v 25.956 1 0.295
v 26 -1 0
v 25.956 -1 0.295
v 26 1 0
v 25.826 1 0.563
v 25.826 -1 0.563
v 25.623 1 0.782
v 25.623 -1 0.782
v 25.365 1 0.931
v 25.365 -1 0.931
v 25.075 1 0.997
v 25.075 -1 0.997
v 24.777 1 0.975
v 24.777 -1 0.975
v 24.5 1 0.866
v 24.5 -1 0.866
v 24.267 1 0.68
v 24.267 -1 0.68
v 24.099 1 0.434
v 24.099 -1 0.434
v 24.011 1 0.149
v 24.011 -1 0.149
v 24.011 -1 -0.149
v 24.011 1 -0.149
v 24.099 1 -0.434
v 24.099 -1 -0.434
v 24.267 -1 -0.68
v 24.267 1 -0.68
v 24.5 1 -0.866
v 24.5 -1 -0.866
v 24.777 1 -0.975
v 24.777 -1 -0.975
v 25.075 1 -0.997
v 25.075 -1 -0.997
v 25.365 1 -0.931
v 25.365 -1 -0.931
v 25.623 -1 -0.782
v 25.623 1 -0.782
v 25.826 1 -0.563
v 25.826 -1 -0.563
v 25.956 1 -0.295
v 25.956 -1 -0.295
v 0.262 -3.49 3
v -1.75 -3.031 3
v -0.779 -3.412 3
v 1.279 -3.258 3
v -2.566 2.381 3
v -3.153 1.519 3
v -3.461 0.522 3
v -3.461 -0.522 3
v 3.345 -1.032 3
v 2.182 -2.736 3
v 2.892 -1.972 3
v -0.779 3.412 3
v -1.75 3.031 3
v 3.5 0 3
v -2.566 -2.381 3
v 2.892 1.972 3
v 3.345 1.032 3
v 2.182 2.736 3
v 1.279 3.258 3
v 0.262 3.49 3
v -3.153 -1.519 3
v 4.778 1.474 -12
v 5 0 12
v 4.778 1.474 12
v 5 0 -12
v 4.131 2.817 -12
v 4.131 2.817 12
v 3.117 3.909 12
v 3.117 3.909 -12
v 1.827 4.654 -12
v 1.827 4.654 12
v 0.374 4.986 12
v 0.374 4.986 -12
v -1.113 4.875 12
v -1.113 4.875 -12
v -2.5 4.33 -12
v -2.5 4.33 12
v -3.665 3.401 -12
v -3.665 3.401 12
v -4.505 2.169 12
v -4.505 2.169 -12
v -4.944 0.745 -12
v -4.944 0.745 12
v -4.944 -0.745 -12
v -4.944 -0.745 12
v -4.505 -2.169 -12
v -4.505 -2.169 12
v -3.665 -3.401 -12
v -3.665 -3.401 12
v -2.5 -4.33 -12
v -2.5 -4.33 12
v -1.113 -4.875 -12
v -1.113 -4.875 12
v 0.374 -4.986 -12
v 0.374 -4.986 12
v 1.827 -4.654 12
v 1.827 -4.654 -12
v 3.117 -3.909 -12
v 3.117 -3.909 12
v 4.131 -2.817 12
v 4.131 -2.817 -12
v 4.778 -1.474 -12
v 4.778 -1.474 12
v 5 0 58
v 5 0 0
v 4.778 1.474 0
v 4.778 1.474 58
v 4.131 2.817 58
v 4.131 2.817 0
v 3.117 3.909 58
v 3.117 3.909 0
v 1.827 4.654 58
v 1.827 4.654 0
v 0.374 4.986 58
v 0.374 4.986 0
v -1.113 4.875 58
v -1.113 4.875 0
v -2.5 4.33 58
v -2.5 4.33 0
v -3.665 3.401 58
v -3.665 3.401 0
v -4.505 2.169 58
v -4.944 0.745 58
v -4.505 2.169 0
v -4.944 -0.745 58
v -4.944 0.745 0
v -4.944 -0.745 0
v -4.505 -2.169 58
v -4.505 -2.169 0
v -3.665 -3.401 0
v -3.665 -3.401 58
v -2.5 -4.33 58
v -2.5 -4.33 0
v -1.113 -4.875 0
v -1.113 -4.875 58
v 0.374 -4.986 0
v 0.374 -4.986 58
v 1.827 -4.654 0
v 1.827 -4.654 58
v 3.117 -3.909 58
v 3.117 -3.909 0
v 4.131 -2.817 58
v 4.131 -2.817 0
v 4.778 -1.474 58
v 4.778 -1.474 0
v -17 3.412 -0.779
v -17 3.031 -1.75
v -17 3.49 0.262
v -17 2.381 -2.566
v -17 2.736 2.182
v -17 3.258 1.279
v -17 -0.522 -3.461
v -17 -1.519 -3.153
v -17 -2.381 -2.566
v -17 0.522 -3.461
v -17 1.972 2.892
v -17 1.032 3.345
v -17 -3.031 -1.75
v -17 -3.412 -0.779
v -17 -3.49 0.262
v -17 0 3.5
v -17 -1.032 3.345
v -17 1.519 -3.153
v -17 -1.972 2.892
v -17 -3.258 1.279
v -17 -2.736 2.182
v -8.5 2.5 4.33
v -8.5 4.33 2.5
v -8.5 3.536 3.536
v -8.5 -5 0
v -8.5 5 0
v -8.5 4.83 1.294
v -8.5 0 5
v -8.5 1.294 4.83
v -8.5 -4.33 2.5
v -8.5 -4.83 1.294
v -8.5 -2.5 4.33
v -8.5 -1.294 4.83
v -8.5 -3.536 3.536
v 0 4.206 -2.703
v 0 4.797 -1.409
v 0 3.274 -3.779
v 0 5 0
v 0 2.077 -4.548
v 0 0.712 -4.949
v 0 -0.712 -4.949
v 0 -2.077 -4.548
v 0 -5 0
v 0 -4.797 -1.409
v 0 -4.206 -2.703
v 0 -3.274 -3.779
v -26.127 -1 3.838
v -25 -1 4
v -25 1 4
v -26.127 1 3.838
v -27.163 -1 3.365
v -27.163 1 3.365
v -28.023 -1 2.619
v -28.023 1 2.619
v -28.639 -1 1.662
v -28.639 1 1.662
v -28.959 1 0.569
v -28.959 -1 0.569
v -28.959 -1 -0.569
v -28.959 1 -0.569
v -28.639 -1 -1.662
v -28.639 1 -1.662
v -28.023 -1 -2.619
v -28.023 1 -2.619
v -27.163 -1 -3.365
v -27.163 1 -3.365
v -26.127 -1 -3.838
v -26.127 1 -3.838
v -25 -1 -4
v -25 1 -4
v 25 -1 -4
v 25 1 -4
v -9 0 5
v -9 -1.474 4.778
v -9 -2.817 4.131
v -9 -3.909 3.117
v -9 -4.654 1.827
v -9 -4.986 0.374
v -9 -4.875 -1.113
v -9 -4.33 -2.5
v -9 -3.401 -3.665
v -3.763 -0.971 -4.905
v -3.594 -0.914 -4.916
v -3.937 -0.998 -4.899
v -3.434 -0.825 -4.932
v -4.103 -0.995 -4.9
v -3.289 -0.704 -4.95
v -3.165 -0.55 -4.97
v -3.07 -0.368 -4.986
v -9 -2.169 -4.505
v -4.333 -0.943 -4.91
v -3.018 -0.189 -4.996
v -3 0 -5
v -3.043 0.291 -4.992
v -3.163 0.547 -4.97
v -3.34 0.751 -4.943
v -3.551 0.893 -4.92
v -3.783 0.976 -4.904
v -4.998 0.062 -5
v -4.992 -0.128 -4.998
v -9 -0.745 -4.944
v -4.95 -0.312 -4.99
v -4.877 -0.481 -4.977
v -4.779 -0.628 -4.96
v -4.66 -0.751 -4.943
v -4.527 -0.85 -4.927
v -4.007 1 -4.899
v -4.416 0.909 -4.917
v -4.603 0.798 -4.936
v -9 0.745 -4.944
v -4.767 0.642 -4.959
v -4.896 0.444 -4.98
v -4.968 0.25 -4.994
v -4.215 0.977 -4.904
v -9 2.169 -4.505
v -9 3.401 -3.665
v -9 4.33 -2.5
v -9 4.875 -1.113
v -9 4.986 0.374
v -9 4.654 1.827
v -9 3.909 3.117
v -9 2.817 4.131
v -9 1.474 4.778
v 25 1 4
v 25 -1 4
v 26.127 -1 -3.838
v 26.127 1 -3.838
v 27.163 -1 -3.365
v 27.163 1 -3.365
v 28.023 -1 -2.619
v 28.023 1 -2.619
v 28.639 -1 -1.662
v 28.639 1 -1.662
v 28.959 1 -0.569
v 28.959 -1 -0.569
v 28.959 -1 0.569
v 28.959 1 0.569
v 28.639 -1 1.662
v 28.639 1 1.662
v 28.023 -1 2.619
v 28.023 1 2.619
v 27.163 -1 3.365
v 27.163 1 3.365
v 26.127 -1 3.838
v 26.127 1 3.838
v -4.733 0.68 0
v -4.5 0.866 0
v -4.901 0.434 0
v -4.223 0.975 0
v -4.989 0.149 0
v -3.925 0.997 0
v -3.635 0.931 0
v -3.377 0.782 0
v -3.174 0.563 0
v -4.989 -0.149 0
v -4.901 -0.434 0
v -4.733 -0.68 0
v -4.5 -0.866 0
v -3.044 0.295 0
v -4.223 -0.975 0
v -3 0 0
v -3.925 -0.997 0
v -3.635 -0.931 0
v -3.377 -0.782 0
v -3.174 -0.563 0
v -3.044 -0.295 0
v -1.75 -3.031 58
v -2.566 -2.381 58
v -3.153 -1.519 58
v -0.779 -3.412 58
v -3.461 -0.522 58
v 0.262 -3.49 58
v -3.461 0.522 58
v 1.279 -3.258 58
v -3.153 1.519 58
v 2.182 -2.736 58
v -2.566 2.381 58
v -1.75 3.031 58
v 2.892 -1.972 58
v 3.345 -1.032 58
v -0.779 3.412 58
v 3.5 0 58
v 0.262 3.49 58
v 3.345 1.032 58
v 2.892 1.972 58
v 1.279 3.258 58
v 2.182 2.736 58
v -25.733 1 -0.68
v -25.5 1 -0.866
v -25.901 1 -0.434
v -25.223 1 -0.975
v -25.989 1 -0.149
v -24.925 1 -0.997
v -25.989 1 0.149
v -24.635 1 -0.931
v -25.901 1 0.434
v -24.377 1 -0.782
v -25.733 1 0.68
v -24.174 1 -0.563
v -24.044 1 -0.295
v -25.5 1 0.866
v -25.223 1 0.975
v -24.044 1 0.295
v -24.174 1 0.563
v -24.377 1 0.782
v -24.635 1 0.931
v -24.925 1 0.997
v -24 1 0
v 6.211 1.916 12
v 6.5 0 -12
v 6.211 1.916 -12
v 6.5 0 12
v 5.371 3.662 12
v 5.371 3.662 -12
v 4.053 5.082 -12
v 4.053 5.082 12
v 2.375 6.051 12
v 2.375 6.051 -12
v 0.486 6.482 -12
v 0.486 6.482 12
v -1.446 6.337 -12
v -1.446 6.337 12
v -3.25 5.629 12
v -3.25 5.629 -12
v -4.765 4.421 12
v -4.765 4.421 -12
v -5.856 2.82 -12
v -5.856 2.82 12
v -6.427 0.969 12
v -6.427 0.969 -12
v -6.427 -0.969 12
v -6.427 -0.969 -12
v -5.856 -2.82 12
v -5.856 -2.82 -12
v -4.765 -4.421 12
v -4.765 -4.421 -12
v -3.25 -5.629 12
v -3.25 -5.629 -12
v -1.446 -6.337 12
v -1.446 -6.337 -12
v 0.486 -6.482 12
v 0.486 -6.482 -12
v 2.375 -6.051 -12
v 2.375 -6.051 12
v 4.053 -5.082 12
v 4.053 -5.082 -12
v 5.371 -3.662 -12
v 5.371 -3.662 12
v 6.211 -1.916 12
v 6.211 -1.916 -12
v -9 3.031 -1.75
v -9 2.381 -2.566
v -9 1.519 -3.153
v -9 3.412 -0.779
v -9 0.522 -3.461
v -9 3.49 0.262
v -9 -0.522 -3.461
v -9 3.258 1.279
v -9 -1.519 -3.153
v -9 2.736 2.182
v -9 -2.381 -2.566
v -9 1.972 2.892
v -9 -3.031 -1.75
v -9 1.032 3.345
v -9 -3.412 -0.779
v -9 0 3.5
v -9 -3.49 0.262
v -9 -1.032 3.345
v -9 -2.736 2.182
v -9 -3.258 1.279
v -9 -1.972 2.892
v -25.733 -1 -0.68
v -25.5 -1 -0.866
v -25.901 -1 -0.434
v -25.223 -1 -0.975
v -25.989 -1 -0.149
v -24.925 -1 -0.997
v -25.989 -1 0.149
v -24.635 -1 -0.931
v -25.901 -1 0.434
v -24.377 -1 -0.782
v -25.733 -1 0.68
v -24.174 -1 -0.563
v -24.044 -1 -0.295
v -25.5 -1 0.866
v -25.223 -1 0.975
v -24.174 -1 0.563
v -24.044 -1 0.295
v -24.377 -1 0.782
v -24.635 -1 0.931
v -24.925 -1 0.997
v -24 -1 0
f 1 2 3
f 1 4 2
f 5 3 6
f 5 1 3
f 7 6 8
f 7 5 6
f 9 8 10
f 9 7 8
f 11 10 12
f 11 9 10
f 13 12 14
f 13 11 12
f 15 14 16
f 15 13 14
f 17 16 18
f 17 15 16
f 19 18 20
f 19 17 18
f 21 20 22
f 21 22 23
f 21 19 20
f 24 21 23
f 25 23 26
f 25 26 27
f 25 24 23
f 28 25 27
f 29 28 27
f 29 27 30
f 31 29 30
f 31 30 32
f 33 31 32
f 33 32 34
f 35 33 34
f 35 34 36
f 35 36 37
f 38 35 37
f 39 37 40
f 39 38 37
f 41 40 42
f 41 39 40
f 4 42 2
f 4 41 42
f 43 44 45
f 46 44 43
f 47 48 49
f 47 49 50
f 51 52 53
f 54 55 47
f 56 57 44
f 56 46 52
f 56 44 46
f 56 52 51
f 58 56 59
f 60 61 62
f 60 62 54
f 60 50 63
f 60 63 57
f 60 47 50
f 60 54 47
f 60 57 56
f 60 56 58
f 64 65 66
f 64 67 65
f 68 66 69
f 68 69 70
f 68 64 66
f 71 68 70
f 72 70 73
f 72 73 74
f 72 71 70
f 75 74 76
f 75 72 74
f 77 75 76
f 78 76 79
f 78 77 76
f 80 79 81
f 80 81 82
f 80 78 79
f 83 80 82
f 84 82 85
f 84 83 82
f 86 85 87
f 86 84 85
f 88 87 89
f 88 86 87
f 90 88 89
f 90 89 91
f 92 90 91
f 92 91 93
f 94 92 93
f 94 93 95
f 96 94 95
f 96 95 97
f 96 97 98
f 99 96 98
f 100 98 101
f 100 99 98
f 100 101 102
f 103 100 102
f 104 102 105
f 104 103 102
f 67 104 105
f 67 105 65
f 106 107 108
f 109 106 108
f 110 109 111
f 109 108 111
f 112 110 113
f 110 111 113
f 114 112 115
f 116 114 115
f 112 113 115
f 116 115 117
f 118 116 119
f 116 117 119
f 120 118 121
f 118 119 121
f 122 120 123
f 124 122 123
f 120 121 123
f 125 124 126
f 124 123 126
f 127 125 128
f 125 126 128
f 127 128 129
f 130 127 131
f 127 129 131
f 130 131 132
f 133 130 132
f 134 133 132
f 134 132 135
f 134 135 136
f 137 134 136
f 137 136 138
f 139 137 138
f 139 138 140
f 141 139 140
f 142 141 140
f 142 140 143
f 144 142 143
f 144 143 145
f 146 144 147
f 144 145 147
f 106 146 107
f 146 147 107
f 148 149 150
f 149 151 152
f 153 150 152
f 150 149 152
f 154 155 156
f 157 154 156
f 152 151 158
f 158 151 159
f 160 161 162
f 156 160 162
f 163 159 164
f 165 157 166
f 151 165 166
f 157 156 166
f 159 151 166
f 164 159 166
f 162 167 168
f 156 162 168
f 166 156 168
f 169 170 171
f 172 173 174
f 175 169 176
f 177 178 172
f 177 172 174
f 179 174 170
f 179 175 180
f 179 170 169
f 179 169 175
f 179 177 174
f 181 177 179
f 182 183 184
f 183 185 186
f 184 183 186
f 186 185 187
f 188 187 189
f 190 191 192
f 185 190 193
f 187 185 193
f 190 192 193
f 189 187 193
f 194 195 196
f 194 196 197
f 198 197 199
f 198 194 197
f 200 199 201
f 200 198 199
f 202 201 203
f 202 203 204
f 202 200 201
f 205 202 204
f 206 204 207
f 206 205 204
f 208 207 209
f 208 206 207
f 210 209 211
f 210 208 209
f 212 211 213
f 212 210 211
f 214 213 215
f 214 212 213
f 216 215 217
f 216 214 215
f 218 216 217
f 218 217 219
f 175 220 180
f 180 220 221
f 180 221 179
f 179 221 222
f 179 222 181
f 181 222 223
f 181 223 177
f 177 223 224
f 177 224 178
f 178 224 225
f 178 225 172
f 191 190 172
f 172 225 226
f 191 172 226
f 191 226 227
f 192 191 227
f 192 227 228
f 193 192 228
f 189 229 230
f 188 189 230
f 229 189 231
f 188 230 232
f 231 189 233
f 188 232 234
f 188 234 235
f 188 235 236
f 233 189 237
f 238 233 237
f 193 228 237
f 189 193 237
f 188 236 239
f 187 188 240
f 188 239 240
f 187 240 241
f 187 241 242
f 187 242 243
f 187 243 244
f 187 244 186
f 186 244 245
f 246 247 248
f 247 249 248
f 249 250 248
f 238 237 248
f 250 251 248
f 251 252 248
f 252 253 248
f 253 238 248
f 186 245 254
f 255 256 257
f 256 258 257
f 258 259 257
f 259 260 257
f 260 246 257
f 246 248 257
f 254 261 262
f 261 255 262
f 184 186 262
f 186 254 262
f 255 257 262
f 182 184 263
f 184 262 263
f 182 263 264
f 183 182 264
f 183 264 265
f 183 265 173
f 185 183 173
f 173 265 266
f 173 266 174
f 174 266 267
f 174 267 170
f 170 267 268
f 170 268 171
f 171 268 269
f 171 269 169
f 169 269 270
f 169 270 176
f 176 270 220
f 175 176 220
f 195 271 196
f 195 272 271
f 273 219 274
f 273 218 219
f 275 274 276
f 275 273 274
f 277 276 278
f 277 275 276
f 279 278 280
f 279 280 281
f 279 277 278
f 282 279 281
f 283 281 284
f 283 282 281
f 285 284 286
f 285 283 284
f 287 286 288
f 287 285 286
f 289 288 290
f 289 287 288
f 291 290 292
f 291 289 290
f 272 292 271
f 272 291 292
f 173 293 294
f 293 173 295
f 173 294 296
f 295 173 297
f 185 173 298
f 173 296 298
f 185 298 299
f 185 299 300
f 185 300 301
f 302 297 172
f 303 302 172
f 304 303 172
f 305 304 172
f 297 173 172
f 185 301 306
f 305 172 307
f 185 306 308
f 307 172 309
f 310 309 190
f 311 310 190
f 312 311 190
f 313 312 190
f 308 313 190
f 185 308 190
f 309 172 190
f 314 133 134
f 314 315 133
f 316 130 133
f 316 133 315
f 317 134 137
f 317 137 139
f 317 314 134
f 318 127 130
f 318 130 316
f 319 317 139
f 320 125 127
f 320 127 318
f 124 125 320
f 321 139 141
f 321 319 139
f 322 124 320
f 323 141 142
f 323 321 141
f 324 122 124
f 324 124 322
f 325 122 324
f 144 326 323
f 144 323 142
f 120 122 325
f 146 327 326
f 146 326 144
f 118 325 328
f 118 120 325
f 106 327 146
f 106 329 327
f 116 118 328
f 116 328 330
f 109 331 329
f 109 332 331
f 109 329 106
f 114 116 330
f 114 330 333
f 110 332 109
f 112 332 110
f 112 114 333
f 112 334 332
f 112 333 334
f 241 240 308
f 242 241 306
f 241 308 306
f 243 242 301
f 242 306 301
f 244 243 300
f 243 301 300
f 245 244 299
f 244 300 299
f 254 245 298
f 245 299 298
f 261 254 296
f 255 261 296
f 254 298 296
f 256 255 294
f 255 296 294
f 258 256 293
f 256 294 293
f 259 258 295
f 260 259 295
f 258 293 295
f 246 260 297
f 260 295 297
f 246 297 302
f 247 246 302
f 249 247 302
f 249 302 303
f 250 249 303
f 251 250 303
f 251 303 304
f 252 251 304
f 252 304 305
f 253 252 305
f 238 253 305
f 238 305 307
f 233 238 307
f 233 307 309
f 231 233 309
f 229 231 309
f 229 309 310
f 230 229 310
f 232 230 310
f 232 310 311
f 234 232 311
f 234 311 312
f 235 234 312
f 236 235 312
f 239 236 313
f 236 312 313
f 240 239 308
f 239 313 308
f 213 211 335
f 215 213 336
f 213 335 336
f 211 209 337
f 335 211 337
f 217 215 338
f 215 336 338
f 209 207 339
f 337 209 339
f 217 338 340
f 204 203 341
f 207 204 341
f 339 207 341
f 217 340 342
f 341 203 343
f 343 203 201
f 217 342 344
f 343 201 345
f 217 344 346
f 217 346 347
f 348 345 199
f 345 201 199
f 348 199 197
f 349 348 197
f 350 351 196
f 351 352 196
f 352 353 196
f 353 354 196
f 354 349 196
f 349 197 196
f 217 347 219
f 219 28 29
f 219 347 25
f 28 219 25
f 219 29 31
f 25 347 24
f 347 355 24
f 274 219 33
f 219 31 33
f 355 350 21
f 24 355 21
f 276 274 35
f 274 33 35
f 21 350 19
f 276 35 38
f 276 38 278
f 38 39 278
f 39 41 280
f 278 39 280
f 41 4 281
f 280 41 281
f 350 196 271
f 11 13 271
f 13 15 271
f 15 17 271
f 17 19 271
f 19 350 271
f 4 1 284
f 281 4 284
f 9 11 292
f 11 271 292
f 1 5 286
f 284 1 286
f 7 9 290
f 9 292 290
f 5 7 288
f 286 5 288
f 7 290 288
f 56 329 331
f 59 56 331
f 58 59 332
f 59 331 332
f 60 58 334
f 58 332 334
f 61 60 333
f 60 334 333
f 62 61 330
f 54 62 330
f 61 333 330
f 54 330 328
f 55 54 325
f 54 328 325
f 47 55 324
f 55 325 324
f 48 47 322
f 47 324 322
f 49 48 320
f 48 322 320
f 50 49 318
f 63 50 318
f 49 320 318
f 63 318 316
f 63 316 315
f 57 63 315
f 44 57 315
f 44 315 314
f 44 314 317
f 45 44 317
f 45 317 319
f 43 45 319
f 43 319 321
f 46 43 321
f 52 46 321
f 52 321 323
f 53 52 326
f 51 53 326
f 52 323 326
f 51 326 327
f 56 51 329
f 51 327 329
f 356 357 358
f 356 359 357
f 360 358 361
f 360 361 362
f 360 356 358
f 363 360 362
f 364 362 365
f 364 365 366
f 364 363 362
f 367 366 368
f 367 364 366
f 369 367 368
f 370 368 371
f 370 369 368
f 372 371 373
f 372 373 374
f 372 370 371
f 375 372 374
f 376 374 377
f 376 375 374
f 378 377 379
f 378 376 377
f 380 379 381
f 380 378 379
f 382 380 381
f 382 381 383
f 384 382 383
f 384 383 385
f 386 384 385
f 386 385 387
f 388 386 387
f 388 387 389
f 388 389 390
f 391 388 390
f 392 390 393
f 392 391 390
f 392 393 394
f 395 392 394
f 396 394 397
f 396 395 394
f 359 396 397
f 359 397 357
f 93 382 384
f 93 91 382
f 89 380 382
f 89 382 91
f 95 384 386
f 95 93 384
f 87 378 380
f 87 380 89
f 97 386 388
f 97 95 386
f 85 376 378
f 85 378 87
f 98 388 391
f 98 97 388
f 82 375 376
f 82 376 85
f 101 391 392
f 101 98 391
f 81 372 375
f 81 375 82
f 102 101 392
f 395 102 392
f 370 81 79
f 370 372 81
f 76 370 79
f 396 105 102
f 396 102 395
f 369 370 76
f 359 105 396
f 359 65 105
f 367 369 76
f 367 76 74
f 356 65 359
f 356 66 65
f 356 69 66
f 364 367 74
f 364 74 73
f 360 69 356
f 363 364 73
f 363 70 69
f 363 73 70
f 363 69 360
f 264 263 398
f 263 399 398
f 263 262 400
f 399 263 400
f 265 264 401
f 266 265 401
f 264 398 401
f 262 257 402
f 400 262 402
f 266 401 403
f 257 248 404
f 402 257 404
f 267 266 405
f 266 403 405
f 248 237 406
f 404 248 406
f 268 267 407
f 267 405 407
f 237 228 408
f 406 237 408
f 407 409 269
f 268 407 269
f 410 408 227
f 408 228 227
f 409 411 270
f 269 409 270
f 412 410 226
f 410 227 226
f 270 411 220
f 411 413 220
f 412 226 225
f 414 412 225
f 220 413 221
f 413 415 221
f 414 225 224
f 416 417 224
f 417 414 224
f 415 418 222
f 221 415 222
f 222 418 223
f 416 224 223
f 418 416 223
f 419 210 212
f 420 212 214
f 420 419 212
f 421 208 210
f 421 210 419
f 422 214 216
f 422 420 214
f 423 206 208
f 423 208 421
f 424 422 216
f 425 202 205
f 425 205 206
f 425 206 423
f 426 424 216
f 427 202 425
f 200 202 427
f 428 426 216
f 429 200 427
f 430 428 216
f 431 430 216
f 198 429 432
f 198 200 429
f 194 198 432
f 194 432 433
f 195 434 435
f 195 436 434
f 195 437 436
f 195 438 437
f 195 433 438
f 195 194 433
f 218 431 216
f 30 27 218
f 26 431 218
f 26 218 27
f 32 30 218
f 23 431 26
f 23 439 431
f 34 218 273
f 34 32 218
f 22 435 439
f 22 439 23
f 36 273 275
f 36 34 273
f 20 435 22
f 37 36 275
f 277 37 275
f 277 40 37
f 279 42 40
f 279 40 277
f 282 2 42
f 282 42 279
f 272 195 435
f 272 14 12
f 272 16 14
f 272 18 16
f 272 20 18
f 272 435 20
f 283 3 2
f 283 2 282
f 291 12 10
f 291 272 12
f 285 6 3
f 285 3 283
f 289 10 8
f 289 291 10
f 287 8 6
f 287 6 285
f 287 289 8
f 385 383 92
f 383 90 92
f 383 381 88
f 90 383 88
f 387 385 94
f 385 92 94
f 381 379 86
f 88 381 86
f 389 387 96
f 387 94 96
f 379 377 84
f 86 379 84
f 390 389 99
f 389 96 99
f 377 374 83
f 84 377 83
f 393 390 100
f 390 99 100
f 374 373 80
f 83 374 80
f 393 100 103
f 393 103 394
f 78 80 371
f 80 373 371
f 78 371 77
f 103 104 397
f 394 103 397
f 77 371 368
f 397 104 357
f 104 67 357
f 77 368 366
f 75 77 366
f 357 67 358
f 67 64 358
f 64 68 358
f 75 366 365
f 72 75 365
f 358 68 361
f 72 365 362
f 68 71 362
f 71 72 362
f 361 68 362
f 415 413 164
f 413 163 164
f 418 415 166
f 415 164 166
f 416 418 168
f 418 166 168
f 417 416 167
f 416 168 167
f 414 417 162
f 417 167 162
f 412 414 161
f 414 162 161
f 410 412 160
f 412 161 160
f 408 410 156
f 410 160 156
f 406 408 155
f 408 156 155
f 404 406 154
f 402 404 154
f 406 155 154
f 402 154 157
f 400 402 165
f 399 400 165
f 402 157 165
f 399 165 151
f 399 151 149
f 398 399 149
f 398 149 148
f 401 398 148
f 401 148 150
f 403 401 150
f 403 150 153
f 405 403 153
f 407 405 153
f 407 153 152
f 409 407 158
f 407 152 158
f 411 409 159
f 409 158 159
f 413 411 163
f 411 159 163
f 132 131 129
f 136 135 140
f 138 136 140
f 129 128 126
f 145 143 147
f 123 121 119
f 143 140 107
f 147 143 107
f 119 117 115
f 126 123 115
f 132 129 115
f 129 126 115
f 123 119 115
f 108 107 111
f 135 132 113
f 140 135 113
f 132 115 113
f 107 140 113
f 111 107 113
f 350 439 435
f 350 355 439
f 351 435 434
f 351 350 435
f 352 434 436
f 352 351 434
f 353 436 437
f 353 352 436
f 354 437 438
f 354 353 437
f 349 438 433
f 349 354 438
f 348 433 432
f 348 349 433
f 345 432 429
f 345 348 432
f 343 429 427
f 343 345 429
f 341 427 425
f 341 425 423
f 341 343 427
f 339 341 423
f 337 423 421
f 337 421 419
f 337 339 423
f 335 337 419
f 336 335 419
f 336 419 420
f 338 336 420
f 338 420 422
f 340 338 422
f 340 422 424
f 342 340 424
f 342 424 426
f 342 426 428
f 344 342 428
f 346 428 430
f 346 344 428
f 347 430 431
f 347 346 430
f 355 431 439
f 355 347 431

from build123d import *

# Parameters (mm, degrees)
F0_R      = 5
F1_DEPTH  = 58
F2_R      = 3.5
F3_DEPTH  = 55
F4_R      = 1
F5_DEPTH  = 1
F8_W      = 8.5
F8_H      = 6
F9_DEPTH  = 5
F10_R     = 1
F11_DEPTH = 5.001
F12_R     = 6.5
F12_R_2   = 5
F13_DEPTH = 12


with BuildPart() as f1:
    # F0 (on Top) → F1 (new body)
    with BuildSketch(Plane.XY):
        Circle(F0_R)
    extrude(amount=F1_DEPTH)

    # F2 (on face) → F3 (cut)
    with BuildSketch(Plane.XY.offset(58)):
        Circle(F2_R)
    extrude(amount=-F3_DEPTH, mode=Mode.SUBTRACT)


with BuildPart() as f5:
    # F4 (on Front) → F5 (new body, symmetric)
    with BuildSketch(Plane.XZ):
        with BuildLine():
            Line((25, 4), (-25, 4))
            ThreePointArc((-25, 4), (-29, 0), (-25, -4))
            Line((-25, -4), (25, -4))
            ThreePointArc((25, -4), (29, 0), (25, 4))
        make_face()
        with Locations((-25, 0)):
            Circle(F4_R, mode=Mode.SUBTRACT)
        with Locations((25, 0)):
            Circle(F4_R, mode=Mode.SUBTRACT)
    extrude(amount=F5_DEPTH, both=True)


with BuildPart() as f7:
    # F6 (on Front) → F7 (revolve)
    with BuildSketch(Plane.XZ):
        Polygon((-17, 0), (0, 0), (0, 5), (-9, 5), (-9, 3.5), (-17, 3.5), align=None)
    revolve(axis=Axis((-8.5, 0, 0), (1, 0, 0)))

    # F8 (on Front) → F9 (cut, symmetric)
    with BuildSketch(Plane.XZ):
        with Locations((-4.25, 3)):
            Rectangle(F8_W, F8_H)
    extrude(amount=F9_DEPTH, both=True, mode=Mode.SUBTRACT)

    # F10 (on face) → F11 (cut, through all)
    with BuildSketch(Plane.XY):
        with Locations((-4, 0)):
            Circle(F10_R)
    extrude(amount=-F11_DEPTH, mode=Mode.SUBTRACT)


with BuildPart() as f13:
    # F12 (on Top) → F13 (new body, symmetric)
    with BuildSketch(Plane.XY):
        Circle(F12_R)
        Circle(F12_R_2, mode=Mode.SUBTRACT)
    extrude(amount=F13_DEPTH, both=True)


solid = Compound([f1.part, f5.part, f7.part, f13.part])
